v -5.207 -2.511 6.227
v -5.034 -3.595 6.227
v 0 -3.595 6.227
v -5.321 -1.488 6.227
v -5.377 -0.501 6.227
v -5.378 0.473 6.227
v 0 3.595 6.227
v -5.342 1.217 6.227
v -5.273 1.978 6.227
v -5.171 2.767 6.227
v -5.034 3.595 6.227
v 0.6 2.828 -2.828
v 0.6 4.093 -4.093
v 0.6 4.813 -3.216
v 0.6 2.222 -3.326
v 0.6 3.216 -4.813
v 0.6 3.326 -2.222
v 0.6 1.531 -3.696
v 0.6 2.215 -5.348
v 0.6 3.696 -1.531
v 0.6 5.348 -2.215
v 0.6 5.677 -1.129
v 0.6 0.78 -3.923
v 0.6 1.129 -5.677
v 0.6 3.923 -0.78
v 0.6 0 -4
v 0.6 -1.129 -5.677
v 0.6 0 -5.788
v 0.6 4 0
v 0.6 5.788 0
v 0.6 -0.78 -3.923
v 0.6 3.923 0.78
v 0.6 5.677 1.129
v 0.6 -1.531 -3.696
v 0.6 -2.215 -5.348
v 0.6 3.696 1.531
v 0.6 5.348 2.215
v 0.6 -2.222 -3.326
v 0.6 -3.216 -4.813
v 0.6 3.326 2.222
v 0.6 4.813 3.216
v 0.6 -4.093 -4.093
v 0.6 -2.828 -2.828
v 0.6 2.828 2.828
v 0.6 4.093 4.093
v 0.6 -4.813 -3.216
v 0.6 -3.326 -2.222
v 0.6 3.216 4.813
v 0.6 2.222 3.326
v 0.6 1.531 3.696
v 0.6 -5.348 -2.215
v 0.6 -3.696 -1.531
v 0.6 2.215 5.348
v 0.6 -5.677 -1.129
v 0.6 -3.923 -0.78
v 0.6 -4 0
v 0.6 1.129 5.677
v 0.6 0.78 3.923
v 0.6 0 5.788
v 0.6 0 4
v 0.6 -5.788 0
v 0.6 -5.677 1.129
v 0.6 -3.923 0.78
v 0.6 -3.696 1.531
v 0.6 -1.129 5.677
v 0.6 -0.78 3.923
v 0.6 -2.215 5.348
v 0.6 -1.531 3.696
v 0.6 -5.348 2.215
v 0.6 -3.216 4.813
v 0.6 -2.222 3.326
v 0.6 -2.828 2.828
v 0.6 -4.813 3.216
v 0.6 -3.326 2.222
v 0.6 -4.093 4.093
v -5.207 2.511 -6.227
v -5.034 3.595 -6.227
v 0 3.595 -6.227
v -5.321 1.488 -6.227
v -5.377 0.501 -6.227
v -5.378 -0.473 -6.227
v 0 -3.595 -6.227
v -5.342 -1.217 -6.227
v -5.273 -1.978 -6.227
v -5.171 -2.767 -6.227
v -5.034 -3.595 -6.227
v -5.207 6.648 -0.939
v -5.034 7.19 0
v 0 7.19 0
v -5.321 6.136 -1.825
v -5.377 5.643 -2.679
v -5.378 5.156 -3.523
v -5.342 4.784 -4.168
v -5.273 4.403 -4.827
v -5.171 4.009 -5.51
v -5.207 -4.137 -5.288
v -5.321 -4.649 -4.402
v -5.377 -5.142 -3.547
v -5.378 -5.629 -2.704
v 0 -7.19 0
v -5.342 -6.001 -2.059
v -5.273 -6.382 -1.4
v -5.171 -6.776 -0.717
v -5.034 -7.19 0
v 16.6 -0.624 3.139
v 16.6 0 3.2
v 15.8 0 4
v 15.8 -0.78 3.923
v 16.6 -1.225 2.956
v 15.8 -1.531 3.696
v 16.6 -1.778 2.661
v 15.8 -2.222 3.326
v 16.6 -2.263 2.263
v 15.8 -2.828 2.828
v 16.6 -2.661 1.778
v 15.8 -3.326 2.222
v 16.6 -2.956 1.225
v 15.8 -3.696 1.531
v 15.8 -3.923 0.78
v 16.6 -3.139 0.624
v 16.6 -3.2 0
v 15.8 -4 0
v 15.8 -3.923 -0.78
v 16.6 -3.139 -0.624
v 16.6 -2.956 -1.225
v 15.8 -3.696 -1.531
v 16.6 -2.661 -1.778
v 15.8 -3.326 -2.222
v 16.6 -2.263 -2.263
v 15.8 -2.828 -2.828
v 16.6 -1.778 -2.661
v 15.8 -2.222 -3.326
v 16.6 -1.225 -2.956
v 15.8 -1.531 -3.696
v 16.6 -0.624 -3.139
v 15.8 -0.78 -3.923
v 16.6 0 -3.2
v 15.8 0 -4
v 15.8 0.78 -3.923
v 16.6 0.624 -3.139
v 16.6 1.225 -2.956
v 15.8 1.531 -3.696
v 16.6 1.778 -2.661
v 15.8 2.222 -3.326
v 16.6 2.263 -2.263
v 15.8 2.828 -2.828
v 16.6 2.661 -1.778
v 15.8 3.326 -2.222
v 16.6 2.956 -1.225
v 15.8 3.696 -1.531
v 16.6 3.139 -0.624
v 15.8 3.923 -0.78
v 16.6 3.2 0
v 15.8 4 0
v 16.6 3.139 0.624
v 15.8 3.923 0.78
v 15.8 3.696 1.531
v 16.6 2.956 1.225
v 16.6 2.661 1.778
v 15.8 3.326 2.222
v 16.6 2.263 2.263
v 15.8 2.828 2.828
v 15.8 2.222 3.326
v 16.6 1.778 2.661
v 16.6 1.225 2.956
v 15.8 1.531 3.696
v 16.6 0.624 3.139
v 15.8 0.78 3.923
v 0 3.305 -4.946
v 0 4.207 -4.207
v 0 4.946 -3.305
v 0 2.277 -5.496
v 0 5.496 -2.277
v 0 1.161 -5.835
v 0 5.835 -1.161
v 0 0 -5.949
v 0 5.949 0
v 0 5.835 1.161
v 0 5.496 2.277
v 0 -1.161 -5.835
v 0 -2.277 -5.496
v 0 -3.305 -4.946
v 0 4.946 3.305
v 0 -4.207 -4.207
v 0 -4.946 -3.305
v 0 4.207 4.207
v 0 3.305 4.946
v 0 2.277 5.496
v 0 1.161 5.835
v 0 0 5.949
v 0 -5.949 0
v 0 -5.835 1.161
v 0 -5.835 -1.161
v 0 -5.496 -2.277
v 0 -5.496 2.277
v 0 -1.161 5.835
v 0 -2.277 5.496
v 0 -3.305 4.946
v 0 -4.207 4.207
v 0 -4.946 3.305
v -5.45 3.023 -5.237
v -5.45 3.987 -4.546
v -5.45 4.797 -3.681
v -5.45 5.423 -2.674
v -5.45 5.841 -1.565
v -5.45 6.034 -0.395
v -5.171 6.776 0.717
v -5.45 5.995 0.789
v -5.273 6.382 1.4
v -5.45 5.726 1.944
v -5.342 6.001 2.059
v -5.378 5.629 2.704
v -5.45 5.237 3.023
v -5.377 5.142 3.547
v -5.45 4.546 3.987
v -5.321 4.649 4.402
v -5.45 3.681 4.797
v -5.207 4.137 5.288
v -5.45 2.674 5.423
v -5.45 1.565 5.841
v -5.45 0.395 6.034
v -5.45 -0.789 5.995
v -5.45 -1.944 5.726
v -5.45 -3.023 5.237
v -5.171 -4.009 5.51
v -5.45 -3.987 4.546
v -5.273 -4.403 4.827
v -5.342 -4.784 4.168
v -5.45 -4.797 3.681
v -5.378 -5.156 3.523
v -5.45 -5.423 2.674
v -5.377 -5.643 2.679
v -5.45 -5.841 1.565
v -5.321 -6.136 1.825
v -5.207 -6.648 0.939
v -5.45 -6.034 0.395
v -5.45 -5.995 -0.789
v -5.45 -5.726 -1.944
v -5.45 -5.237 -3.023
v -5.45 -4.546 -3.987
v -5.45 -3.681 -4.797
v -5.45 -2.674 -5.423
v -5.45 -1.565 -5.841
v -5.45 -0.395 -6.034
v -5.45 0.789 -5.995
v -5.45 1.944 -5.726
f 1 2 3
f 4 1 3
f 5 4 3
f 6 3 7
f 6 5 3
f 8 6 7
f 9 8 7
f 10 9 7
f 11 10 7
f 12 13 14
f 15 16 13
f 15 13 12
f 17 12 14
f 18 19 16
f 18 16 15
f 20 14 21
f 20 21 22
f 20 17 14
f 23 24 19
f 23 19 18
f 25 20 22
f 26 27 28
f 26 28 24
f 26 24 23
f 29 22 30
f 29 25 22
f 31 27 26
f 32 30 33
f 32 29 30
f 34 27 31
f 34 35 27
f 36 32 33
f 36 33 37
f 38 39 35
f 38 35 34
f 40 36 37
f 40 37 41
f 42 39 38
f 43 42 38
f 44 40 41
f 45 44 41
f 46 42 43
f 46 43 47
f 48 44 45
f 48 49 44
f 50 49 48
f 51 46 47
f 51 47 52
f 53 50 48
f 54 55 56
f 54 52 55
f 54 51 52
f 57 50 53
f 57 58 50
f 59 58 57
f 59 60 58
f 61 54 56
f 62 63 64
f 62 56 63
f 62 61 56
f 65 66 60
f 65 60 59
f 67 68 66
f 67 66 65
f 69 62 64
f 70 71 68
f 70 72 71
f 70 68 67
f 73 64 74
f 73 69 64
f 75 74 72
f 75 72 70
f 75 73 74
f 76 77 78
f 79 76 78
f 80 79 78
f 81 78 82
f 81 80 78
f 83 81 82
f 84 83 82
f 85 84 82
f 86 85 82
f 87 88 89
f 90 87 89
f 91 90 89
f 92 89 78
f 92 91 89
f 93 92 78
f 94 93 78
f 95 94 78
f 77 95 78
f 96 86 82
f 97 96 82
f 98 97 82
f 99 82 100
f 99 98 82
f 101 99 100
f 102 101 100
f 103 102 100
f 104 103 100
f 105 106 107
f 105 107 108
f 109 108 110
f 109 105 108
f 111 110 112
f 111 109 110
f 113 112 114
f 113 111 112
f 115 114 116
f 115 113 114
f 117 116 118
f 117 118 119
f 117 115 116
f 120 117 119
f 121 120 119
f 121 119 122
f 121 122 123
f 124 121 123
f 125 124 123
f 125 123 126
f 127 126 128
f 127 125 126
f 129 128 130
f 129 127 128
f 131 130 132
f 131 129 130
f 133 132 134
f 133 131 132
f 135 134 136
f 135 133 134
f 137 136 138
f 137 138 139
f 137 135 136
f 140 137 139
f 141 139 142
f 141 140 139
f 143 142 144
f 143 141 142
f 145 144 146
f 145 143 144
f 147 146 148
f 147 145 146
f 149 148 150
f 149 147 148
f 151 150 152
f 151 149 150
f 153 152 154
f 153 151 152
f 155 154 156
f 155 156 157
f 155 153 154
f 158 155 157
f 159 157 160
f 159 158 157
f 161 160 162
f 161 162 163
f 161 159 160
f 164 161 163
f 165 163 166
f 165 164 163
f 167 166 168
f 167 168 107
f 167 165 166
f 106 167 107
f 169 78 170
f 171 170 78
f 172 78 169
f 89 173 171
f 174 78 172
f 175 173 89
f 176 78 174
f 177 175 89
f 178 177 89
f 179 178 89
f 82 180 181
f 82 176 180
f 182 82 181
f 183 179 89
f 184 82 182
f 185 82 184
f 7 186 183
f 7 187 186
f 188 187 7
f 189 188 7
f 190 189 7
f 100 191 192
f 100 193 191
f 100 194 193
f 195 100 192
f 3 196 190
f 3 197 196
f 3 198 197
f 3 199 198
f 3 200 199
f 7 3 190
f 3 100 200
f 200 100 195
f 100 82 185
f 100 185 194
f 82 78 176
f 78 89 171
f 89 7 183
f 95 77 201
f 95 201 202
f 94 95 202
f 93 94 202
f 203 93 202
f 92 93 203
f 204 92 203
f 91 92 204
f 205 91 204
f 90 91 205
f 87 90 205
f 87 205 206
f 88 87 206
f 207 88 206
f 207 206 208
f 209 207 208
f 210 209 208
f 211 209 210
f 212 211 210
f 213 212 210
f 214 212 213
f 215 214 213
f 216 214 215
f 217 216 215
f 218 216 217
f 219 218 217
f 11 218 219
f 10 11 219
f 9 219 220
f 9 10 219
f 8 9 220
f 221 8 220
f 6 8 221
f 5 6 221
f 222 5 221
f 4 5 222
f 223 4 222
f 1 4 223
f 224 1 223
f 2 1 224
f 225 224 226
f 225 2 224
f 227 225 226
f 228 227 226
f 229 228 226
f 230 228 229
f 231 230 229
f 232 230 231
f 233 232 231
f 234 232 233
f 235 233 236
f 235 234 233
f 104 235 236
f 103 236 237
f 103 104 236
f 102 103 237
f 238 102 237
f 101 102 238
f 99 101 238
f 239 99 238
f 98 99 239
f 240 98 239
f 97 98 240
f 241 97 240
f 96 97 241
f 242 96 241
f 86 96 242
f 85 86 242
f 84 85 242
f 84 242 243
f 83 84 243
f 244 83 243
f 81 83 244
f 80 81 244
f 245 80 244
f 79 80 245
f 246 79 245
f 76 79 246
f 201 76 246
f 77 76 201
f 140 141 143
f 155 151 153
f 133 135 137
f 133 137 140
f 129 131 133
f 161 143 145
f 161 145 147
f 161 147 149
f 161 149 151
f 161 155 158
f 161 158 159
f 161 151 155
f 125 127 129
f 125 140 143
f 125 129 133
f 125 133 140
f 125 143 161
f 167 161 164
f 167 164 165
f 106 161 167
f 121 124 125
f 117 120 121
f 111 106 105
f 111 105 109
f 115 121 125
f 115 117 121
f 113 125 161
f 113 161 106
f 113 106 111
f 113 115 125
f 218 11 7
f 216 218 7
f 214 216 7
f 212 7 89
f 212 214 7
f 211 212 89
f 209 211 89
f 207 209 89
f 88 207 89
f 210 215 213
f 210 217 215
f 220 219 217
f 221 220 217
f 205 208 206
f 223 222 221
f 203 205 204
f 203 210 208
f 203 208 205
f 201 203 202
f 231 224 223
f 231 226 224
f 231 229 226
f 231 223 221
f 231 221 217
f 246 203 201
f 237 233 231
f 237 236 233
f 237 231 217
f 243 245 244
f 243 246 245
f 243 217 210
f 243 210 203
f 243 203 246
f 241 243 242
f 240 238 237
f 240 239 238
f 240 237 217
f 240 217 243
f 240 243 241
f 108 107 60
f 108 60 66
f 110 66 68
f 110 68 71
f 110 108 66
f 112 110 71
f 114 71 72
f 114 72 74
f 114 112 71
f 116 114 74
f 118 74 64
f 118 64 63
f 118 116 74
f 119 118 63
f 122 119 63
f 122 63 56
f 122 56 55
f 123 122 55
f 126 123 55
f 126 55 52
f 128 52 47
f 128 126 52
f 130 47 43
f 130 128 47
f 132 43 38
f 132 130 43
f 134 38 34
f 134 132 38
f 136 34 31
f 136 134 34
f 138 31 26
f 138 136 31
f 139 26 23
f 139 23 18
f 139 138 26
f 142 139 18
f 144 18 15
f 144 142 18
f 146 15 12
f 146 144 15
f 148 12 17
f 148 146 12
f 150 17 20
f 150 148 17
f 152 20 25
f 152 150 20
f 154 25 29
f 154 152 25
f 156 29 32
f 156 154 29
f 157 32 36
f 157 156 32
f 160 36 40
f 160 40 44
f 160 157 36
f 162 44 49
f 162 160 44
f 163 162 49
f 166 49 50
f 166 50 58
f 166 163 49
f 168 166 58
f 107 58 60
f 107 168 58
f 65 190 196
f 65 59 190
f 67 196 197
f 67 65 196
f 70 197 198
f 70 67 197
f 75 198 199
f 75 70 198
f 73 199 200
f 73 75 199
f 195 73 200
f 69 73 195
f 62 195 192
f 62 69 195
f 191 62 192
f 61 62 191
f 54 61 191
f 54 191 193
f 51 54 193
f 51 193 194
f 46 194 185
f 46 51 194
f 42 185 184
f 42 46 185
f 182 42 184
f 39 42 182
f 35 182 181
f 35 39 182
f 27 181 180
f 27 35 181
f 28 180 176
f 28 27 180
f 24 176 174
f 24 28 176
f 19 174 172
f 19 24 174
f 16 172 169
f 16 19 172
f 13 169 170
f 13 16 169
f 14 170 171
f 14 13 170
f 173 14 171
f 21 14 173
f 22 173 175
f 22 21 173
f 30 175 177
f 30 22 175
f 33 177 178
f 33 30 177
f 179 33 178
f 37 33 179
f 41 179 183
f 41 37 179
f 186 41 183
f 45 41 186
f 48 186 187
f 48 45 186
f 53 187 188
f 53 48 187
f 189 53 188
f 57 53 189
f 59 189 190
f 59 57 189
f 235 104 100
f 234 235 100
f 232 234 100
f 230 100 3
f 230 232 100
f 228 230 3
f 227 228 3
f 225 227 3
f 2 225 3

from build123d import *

# Parameters (mm, degrees)
SKETCH_2_OUTSIDE_W  = 22.38
SKETCH_2_OUTSIDE_H  = 22.38
CUT_EXTRUDE_1_DEPTH = 25.281571201
CHAMFER_1_SIZE      = 0.8


with BuildPart() as part:
    # Эскиз1 → Повернуть1 (revolve)
    with BuildSketch(Plane.XY, mode=Mode.PRIVATE) as revolve_1_sk:
        Polygon((-5.45, 0), (-5.45, 7.19), (0, 7.19), (0, 5.948974596), (0.6, 5.788205081), (0.6, 4), (16.6, 4), (16.6, 0), align=None)
    revolve(revolve_1_sk.sketch.rotate(Axis((-1000, 0, 0), (1, 0, 0)), 90), axis=Axis((-1000, 0, 0), (1, 0, 0)))

    # Эскиз2 outside → Вырез-Вытянуть1 (cut, through all)
    with BuildSketch(Plane.ZY.offset(5.45)):
        Rectangle(SKETCH_2_OUTSIDE_W, SKETCH_2_OUTSIDE_H)
        Polygon((0, -7.19), (6.226722653, -3.595), (6.226722653, 3.595), (0, 7.19), (-6.226722653, 3.595), (-6.226722653, -3.595), align=None, mode=Mode.SUBTRACT)
    extrude(amount=-CUT_EXTRUDE_1_DEPTH, mode=Mode.SUBTRACT)

    # Эскиз4 → Вырез-Повернуть1 (revolve, cut)
    with BuildSketch(Plane.XY, mode=Mode.PRIVATE) as cut_revolve_1_sk:
        Polygon((-5.45, 6.04675), (-5.03389103, 7.19), (-5.45, 7.19), align=None)
    revolve(cut_revolve_1_sk.sketch.rotate(Axis((-1000, 0, 0), (1, 0, 0)), 299.999999983), axis=Axis((-1000, 0, 0), (1, 0, 0)), mode=Mode.SUBTRACT)

    # Фаска1
    chamfer_1_edges = [part.edges().sort_by_distance(p)[0] for p in [
        (16.6, 0, -4),
    ]]
    chamfer(chamfer_1_edges, length=CHAMFER_1_SIZE)


solid = part.part
